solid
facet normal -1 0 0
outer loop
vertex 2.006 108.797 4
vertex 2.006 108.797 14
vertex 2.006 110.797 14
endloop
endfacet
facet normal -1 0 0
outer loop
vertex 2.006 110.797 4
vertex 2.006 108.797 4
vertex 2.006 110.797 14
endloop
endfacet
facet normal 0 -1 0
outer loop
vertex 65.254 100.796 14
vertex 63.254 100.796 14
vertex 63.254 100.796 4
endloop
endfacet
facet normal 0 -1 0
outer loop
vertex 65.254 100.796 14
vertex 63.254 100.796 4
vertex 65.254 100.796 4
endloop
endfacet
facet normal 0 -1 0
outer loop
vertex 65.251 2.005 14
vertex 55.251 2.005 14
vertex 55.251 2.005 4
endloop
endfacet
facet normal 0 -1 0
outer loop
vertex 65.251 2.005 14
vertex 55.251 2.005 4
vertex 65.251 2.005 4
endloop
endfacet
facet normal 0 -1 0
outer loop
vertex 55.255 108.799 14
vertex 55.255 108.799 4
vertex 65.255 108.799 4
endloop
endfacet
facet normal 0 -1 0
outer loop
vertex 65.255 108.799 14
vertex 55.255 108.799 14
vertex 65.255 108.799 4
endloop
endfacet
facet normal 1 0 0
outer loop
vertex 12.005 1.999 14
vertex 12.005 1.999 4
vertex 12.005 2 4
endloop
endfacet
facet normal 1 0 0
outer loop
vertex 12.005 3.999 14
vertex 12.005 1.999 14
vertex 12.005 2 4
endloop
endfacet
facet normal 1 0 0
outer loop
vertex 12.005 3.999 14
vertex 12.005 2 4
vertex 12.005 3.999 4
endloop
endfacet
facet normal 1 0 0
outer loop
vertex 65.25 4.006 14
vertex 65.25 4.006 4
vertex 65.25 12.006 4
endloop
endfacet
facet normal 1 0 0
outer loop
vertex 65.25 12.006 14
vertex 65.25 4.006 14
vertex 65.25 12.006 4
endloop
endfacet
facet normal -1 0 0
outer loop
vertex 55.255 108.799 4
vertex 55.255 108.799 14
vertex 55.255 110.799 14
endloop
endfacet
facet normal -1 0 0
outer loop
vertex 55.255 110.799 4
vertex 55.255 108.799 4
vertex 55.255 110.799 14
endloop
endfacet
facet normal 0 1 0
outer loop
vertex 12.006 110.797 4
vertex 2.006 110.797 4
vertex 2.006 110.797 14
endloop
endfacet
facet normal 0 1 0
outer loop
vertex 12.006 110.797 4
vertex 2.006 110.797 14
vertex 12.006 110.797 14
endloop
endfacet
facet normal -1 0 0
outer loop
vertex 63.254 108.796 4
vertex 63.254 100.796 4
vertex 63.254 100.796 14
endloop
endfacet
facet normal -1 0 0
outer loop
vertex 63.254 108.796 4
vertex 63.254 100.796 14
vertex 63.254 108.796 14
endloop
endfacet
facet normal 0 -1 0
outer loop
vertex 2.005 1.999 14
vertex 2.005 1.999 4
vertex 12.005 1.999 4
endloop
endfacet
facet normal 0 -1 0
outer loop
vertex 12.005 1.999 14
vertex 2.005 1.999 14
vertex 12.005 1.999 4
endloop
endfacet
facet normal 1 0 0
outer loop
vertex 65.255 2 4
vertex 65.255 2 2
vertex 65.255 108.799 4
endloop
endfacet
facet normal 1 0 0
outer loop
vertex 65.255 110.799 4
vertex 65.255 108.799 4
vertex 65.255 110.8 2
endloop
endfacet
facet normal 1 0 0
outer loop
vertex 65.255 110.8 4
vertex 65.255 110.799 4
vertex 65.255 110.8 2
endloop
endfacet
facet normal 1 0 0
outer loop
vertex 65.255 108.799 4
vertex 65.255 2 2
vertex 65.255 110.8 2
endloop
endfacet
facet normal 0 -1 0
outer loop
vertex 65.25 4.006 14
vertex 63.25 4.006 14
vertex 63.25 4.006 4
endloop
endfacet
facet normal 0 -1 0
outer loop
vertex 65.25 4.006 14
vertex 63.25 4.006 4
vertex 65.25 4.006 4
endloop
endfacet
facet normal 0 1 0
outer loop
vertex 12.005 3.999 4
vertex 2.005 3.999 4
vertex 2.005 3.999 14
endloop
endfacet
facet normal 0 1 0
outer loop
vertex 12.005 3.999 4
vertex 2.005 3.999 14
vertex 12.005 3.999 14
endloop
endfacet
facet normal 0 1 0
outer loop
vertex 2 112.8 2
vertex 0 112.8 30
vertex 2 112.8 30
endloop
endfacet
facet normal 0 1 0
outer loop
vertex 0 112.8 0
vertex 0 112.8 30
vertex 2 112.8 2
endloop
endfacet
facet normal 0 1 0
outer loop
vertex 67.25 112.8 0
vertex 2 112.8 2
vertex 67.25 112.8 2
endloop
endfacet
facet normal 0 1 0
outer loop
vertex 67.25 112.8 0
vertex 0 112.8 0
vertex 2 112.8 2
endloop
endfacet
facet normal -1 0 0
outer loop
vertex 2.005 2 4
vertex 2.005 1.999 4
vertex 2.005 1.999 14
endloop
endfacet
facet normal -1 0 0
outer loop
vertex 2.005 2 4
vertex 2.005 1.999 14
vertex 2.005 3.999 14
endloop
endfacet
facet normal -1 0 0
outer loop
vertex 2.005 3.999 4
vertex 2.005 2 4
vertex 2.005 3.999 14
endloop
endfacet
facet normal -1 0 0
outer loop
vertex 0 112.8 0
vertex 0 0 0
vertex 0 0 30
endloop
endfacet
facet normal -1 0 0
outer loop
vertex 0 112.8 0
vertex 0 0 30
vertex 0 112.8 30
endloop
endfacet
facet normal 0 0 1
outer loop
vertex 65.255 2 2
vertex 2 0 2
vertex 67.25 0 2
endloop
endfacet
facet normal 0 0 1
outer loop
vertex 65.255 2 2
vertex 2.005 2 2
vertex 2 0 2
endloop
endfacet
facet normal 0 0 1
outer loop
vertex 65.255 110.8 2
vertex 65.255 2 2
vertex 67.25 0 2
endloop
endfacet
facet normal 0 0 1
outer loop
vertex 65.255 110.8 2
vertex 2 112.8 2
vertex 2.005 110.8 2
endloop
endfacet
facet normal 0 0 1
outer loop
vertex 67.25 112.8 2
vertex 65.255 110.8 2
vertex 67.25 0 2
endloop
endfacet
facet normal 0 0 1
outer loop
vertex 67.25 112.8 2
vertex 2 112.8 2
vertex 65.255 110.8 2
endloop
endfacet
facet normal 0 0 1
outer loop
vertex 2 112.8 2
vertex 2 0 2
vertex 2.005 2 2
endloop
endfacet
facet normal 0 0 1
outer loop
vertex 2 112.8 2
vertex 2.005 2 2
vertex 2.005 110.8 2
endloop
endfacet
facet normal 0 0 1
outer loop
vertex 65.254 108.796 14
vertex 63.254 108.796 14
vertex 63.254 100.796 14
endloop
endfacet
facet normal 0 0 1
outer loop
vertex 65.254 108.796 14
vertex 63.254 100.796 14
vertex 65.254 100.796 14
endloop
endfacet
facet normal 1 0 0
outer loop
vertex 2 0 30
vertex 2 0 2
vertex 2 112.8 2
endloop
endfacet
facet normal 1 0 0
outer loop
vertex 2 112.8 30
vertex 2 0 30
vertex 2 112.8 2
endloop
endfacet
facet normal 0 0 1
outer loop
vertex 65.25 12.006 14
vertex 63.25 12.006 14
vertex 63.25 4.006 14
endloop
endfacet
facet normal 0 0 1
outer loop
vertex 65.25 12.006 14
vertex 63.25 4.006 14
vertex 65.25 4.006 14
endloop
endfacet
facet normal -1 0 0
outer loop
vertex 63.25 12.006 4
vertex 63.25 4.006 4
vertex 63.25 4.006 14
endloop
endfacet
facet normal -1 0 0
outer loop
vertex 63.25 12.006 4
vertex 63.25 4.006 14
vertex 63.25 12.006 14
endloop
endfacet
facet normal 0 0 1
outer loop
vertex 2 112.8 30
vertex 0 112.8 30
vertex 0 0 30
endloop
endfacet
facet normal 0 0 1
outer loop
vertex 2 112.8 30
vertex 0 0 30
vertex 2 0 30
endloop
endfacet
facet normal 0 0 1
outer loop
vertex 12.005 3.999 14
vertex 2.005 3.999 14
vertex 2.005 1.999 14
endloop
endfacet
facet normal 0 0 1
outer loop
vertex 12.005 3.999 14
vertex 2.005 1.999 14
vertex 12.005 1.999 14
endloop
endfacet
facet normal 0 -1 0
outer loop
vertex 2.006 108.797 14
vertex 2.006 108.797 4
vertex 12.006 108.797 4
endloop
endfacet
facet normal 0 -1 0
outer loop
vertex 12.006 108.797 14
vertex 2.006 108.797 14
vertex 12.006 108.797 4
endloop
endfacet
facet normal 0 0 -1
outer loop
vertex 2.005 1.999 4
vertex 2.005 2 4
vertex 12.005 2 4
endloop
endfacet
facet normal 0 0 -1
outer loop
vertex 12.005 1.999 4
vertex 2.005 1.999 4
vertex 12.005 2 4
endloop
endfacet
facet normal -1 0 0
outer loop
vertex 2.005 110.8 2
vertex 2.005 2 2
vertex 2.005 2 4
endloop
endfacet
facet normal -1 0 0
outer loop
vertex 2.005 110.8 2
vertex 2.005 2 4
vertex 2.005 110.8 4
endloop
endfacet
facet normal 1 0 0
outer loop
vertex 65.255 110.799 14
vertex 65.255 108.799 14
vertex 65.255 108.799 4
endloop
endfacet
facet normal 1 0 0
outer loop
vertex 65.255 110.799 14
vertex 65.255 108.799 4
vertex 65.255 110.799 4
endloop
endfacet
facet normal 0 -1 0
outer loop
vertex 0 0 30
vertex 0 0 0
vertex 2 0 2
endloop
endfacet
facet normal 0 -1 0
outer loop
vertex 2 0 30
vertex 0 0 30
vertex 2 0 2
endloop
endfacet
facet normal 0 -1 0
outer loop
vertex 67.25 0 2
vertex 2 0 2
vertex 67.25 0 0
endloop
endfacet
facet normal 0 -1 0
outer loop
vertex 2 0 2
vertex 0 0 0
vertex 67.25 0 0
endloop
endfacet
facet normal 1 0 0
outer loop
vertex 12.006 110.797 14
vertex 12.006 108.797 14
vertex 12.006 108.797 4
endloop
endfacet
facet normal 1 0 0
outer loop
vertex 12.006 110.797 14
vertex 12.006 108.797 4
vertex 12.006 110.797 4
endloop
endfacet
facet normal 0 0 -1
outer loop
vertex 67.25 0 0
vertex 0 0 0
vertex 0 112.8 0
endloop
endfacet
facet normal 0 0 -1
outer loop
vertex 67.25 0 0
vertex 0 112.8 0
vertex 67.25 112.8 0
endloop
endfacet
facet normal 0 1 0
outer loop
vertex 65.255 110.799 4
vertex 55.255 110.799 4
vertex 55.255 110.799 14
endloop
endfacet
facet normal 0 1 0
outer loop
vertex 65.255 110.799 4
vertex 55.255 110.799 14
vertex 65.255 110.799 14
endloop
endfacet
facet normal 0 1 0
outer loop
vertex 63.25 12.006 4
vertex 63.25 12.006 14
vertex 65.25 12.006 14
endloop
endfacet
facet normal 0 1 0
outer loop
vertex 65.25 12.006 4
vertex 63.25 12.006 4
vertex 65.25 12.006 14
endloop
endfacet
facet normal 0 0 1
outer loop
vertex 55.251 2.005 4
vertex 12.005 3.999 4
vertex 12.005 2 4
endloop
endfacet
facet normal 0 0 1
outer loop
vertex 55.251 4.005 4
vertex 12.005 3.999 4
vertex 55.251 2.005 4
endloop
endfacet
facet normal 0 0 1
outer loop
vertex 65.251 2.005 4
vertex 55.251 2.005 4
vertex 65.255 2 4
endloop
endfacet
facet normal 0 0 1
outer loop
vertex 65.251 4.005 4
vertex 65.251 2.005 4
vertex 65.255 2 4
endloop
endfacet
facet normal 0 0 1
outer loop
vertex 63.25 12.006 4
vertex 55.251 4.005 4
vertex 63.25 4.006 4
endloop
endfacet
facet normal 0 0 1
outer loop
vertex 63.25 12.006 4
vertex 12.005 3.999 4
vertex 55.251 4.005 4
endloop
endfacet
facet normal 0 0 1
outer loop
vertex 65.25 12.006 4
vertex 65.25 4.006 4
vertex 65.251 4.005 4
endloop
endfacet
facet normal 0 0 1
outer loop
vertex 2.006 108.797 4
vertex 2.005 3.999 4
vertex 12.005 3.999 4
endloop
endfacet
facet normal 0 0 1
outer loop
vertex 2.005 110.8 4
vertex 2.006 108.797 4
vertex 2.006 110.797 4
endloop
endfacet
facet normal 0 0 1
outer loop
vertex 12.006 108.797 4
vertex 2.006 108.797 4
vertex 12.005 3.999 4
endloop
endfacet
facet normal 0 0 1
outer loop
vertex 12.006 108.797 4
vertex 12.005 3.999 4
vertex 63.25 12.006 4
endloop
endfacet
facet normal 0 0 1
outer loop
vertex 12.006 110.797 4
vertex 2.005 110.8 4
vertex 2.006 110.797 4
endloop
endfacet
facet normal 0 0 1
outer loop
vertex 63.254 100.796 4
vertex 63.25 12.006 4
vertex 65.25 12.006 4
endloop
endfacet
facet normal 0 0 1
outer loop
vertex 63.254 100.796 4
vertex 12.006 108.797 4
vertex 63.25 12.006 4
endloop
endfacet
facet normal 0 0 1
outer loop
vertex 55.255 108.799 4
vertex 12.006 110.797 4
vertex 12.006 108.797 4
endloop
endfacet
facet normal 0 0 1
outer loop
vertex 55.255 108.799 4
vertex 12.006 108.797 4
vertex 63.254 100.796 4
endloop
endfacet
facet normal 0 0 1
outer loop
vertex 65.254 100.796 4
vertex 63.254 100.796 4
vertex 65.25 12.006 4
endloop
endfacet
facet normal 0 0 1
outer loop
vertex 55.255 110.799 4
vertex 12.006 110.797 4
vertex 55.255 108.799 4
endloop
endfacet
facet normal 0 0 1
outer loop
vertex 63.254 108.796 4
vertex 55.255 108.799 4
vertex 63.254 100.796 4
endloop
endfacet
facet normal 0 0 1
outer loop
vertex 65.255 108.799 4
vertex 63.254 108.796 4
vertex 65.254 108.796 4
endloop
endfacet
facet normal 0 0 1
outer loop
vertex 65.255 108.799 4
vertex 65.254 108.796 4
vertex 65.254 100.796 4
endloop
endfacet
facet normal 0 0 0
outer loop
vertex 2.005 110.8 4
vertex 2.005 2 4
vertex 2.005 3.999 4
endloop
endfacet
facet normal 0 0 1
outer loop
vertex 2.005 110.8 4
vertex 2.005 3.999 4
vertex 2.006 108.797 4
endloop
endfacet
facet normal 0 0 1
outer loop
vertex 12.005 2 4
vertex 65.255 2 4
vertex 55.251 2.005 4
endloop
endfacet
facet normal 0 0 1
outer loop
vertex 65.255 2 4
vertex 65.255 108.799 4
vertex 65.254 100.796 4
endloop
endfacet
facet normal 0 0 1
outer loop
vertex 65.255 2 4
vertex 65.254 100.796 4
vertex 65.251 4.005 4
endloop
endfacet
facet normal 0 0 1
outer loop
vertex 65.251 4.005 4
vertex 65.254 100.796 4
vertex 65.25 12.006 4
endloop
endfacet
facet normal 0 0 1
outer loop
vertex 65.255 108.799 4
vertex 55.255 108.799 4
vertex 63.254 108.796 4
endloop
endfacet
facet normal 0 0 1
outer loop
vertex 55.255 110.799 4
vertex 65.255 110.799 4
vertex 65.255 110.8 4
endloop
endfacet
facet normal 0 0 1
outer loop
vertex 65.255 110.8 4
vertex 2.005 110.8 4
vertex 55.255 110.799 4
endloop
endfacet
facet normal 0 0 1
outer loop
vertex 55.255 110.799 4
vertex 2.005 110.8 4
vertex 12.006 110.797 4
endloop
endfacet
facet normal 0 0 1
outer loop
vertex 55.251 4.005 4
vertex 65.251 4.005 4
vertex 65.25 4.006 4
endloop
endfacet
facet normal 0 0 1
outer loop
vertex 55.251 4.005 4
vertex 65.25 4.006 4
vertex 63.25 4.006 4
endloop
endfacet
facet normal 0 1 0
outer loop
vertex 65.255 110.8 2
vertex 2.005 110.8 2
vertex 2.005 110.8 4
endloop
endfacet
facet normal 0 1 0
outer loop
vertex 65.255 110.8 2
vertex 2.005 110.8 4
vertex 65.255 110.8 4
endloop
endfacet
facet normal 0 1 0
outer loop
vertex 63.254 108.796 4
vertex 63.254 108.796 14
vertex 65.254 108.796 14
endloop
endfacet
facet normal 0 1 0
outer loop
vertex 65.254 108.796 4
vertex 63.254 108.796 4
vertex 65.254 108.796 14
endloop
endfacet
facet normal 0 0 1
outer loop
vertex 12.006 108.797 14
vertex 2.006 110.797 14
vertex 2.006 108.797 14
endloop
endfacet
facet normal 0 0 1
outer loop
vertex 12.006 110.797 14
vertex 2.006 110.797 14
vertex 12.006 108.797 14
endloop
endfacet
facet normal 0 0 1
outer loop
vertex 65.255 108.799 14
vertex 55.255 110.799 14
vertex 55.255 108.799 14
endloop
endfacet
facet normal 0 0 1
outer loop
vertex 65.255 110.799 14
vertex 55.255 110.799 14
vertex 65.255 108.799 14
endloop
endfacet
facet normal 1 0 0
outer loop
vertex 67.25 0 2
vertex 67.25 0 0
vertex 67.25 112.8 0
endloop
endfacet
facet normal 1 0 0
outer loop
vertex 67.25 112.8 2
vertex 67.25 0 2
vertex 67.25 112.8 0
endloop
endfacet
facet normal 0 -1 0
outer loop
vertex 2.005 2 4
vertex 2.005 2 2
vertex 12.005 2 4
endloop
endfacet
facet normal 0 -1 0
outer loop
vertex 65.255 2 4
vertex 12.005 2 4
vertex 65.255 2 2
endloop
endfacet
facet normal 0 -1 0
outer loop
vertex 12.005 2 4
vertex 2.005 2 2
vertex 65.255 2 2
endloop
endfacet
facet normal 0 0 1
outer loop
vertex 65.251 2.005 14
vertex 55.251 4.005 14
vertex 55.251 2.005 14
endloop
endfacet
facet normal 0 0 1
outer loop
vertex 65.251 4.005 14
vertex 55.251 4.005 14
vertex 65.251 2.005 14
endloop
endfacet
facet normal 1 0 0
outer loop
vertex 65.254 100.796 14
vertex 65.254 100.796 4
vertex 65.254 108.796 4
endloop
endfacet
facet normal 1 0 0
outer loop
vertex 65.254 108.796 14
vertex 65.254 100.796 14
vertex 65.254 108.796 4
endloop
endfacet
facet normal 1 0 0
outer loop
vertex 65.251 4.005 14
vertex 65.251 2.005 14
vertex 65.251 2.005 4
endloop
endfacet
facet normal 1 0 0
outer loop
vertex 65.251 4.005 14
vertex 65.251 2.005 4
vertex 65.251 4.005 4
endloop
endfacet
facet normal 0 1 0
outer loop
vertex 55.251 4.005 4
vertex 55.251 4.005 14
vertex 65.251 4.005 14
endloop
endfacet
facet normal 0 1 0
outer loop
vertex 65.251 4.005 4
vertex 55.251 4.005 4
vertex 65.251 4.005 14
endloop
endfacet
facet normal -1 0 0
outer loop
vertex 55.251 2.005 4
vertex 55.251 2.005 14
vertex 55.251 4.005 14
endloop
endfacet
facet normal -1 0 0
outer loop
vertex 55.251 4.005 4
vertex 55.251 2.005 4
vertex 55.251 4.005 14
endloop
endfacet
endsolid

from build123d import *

# Parameters (mm, degrees)
SKETCH_W     = 67.25
SKETCH_H     = 112.8
PAD_DEPTH    = 30
THICKNESS_T  = -2
SKETCH001_W  = 63.25
SKETCH001_H  = 108.800063
PAD001_DEPTH = 2
SKETCH002_W  = 10
SKETCH002_H  = 2
PAD002_DEPTH = 10
SKETCH003_W  = 10
SKETCH003_H  = 2
PAD003_DEPTH = 10
SKETCH004_W  = 2
SKETCH004_H  = 8
PAD004_DEPTH = 10
SKETCH005_W  = 10
SKETCH005_H  = 2
PAD005_DEPTH = 10
SKETCH006_W  = 2
SKETCH006_H  = 8
PAD006_DEPTH = 10
SKETCH007_W  = 10
SKETCH007_H  = 2
PAD007_DEPTH = 10


with BuildPart() as part:
    # Sketch → Pad (new body)
    with BuildSketch(Plane.XY):
        with Locations((33.625, 56.4)):
            Rectangle(SKETCH_W, SKETCH_H)
    extrude(amount=PAD_DEPTH)

    # Thickness
    thickness_openings = [part.faces().sort_by_distance(p)[0] for p in [
        (67.25, 56.4, 15),
        (33.625, 0, 15),
        (33.625, 56.4, 30),
        (33.625, 112.8, 15),
    ]]
    offset(amount=THICKNESS_T, openings=thickness_openings)

    # Sketch001 (on Face8 of Thickness) → Pad001 (join)
    with BuildSketch(Plane.XY.offset(2)):
        with Locations((33.630087, 56.399667)):
            Rectangle(SKETCH001_W, SKETCH001_H)
    extrude(amount=PAD001_DEPTH)

    # Sketch002 (on Face13 of Pad001) → Pad002 (join)
    with BuildSketch(Plane.XY.offset(4)):
        with Locations((7.005123, 2.998829)):
            Rectangle(SKETCH002_W, SKETCH002_H)
    extrude(amount=PAD002_DEPTH)

    # Sketch003 (on Face13 of Pad002) → Pad003 (join)
    with BuildSketch(Plane.XY.offset(4)):
        with Locations((60.25087, 3.005487)):
            Rectangle(SKETCH003_W, SKETCH003_H)
    extrude(amount=PAD003_DEPTH)

    # Sketch004 (on Face13 of Pad003) → Pad004 (join)
    with BuildSketch(Plane.XY.offset(4)):
        with Locations((64.250015, 8.00565)):
            Rectangle(SKETCH004_W, SKETCH004_H)
    extrude(amount=PAD004_DEPTH)

    # Sketch005 (on Face13 of Pad004) → Pad005 (join)
    with BuildSketch(Plane.XY.offset(4)):
        with Locations((60.255219, 109.799278)):
            Rectangle(SKETCH005_W, SKETCH005_H)
    extrude(amount=PAD005_DEPTH)

    # Sketch006 (on Face13 of Pad005) → Pad006 (join)
    with BuildSketch(Plane.XY.offset(4)):
        with Locations((64.253967, 104.795769)):
            Rectangle(SKETCH006_W, SKETCH006_H)
    extrude(amount=PAD006_DEPTH)

    # Sketch007 (on Face13 of Pad006) → Pad007 (join)
    with BuildSketch(Plane.XY.offset(4)):
        with Locations((7.006138, 109.796768)):
            Rectangle(SKETCH007_W, SKETCH007_H)
    extrude(amount=PAD007_DEPTH)


solid = part.part
